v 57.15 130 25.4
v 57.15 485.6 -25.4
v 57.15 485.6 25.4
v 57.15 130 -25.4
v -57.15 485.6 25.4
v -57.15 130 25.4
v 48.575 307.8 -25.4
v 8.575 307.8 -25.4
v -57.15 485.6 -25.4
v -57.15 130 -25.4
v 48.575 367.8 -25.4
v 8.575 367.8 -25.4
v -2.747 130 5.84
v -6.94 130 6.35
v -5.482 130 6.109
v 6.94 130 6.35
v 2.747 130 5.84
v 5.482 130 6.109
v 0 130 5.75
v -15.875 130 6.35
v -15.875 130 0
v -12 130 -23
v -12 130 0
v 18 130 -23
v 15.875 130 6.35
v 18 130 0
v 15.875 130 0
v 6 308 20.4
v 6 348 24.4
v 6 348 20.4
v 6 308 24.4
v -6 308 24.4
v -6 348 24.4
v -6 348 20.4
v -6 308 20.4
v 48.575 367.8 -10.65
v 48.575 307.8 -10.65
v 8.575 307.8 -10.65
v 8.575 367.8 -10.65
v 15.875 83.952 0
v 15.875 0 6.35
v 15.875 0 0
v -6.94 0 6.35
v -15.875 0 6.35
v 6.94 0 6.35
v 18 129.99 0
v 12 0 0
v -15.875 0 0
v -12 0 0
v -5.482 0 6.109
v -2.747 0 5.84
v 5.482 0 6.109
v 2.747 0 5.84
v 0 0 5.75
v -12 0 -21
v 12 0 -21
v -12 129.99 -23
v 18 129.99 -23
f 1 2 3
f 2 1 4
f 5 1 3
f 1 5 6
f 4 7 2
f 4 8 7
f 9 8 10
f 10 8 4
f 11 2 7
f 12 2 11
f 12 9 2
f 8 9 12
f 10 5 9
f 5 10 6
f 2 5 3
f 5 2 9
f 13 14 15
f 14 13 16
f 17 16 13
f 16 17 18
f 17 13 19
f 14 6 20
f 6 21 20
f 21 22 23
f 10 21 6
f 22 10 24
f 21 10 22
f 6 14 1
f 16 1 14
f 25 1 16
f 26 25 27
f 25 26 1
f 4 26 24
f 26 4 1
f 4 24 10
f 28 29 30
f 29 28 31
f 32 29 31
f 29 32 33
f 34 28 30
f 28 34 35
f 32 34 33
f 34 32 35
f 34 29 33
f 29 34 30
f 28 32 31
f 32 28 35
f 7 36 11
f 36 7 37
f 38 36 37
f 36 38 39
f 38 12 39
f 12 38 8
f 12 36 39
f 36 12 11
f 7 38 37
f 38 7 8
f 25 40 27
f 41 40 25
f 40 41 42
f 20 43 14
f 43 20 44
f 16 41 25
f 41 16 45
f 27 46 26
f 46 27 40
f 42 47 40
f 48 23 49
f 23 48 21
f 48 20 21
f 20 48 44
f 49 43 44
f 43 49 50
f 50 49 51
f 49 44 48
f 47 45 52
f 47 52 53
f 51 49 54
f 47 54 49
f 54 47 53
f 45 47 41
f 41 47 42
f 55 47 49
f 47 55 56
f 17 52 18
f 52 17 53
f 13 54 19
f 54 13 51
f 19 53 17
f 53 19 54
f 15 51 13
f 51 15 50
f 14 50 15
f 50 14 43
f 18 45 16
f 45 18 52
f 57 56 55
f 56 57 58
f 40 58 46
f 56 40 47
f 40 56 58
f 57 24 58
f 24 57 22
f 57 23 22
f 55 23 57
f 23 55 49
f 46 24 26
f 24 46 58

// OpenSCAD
// Electric violin — parametric master (solid-body, 4-string baseline; 5-string variant).
//
// Authority: pending_measurement. NOT fabrication authority until reviewed
// against a measured prototype and family-spec.csv gates (see
// visual-output-register.csv VIS-009 and validation.csv). String tensions,
// neck set/break angle, bridge fit, and the sculpted body outline are all
// measurement_required — see family-spec.csv (dimension_provenance =
// measurement_required) and design.md.
//
// Dimension sources (do not edit values without updating the source record):
//   - scale (vibrating string) length 328 mm: family-spec.csv EV-4S baseline
//     (scale_mm). AUTHORITATIVE for the family. design-table BUILD METHOD
//     step 1 corroborates "328 mm (13 in)".
//   - string count 4 (baseline) / 5 (variant): family-spec.csv.
//   - body blank 2 x 8 x 16 in (50.8 x 203.2 x 406.4 mm): design-table BOM row 1.
//   - body target thickness 2 in (50 mm): design-table step 4.
//   - body length ~14 in (~356 mm): design-table geometry note (§3 / step 2).
//   - neck nut-to-body-joint 130 mm: design-table step 2.
//   - nut width 24 mm (4-string): design-table BOM row 9 (neck ~21 mm at nut
//     per step 14 is a profile depth, not width).
//   - fingerboard 1/4 x 1.25 x 11 in, radius 42 mm at nut: design-table BOM row 3.
//   - piezo recess under bridge (shallow): design-table step 8 — depth per
//     pickup (assumption below, measurement_required).
//   - body OUTLINE: skeletal/sculpted, style-open. The block envelope below is a
//     NON-AUTHORITATIVE placeholder only (design-table §3 "often skeletal").
//
// Units: millimetres. Datum: nut face at y = 0; +y toward the bridge/tailpiece;
// body centerline = y axis.

in2mm = 25.4;

/* [Variant] */
// 0 = 4-string baseline (family-spec active), 1 = 5-string variant
variant = 0;
string_counts = [4, 5];
string_count  = string_counts[variant];

/* [Scale + strings — AUTHORITATIVE from family-spec.csv] */
scale_length_mm = 328;      // vibrating length, nut to bridge (EV-4S / EV-5S)
nut_width_mm     = 24;      // design-table BOM row 9 (4-string); +TBD for 5-string
string_spacing_mm = nut_width_mm / (string_count + 1); // even spacing (assumption)

/* [Body blank — design-table BOM row 1 (stock, AUTHORITATIVE size)] */
blank_thickness_mm = 2.0 * in2mm;   // 50.8 mm (target 50 mm surfaced, step 4)
blank_width_mm     = 8.0 * in2mm;   // 203.2 mm
blank_length_mm    = 16.0 * in2mm;  // 406.4 mm

/* [Body envelope — NON-AUTHORITATIVE placeholder (skeletal/sculpted, style-open)] */
body_length_mm    = 14.0 * in2mm;   // ~356 mm design-table geometry note
body_width_mm     = 4.5 * in2mm;    // placeholder solid-body waist; outline TBD
body_thickness_mm = blank_thickness_mm;

/* [Neck + fingerboard — design-table steps 2/14, BOM row 3] */
neck_join_from_nut_mm = 130;        // design-table step 2
fb_length_mm   = 11.0 * in2mm;      // 279.4 mm
fb_width_mm    = 1.25 * in2mm;      // 31.75 mm
fb_thick_mm    = 0.25 * in2mm;      // 6.35 mm
fb_radius_mm   = 42;                // radius at nut, design-table BOM row 3
neck_depth_nut_mm  = 21;            // design-table step 14 (profile depth)
neck_depth_body_mm = 23;            // design-table step 14

/* [Bridge + electronics — measurement_required (assumptions for layout)] */
piezo_recess_len_mm   = 40;    // shallow under-bridge pocket; depth per pickup
piezo_recess_wid_mm   = 12;
piezo_recess_depth_mm = 3;     // assumption; measurement_required (step 8)
elec_pocket_len_mm    = 60;    // volume pot + jack stack (assumption, step 9)
elec_pocket_wid_mm    = 40;
elec_pocket_depth_mm  = 30;    // assumption; measurement_required

// ---------------------------------------------------------------------------
// Derived datum geometry (formulas, not baked placement)
// ---------------------------------------------------------------------------

bridge_from_nut_mm  = scale_length_mm;                   // bridge on scale line
bridge_from_join_mm = scale_length_mm - neck_join_from_nut_mm; // 198 mm
// Body sits so its upper (neck-joint) edge is at the neck/body joint.
body_center_y = neck_join_from_nut_mm + body_length_mm / 2;

module body_envelope() {
  // Placeholder solid-body block (NON-AUTHORITATIVE outline).
  translate([-body_width_mm / 2, neck_join_from_nut_mm, -body_thickness_mm / 2])
    cube([body_width_mm, body_length_mm, body_thickness_mm]);
}

module fingerboard() {
  // From nut (+y) over the neck; radiused top face approximated by a cylinder cut.
  translate([-fb_width_mm / 2, 0, 0])
    difference() {
      cube([fb_width_mm, fb_length_mm, fb_thick_mm]);
      translate([fb_width_mm / 2, -1, fb_thick_mm + fb_radius_mm - 0.6])
        rotate([-90, 0, 0])
          cylinder(h = fb_length_mm + 2, r = fb_radius_mm, $fn = 96);
    }
}

module neck_blank() {
  // Tapered neck depth nut->body per design-table step 14; under the fingerboard.
  hull() {
    translate([0, 0, -neck_depth_nut_mm])
      cube([nut_width_mm, 0.01, neck_depth_nut_mm], center = false);
    translate([0, neck_join_from_nut_mm - 0.01, -neck_depth_body_mm])
      cube([nut_width_mm + 6, 0.01, neck_depth_body_mm], center = false);
  }
}

module piezo_recess() {
  translate([0, bridge_from_nut_mm, body_thickness_mm / 2 - piezo_recess_depth_mm])
    cube([piezo_recess_wid_mm, piezo_recess_len_mm, piezo_recess_depth_mm + 1],
         center = true);
}

module electronics_pocket() {
  translate([body_width_mm / 4, body_center_y + 30,
             -body_thickness_mm / 2 - 0.5])
    cube([elec_pocket_wid_mm, elec_pocket_len_mm, elec_pocket_depth_mm + 0.5],
         center = true);
}

module electric_violin() {
  difference() {
    union() { body_envelope(); }
    piezo_recess();
    electronics_pocket();
  }
  fingerboard();
  translate([-nut_width_mm / 2, 0, 0]) neck_blank();
}

electric_violin();

// Echo key datum values so `openscad` doubles as a layout check.
echo(str("variant_strings=", string_count));
echo(str("scale_length_mm=", scale_length_mm));
echo(str("bridge_from_join_mm=", bridge_from_join_mm));
echo(str("string_spacing_mm=", string_spacing_mm));
